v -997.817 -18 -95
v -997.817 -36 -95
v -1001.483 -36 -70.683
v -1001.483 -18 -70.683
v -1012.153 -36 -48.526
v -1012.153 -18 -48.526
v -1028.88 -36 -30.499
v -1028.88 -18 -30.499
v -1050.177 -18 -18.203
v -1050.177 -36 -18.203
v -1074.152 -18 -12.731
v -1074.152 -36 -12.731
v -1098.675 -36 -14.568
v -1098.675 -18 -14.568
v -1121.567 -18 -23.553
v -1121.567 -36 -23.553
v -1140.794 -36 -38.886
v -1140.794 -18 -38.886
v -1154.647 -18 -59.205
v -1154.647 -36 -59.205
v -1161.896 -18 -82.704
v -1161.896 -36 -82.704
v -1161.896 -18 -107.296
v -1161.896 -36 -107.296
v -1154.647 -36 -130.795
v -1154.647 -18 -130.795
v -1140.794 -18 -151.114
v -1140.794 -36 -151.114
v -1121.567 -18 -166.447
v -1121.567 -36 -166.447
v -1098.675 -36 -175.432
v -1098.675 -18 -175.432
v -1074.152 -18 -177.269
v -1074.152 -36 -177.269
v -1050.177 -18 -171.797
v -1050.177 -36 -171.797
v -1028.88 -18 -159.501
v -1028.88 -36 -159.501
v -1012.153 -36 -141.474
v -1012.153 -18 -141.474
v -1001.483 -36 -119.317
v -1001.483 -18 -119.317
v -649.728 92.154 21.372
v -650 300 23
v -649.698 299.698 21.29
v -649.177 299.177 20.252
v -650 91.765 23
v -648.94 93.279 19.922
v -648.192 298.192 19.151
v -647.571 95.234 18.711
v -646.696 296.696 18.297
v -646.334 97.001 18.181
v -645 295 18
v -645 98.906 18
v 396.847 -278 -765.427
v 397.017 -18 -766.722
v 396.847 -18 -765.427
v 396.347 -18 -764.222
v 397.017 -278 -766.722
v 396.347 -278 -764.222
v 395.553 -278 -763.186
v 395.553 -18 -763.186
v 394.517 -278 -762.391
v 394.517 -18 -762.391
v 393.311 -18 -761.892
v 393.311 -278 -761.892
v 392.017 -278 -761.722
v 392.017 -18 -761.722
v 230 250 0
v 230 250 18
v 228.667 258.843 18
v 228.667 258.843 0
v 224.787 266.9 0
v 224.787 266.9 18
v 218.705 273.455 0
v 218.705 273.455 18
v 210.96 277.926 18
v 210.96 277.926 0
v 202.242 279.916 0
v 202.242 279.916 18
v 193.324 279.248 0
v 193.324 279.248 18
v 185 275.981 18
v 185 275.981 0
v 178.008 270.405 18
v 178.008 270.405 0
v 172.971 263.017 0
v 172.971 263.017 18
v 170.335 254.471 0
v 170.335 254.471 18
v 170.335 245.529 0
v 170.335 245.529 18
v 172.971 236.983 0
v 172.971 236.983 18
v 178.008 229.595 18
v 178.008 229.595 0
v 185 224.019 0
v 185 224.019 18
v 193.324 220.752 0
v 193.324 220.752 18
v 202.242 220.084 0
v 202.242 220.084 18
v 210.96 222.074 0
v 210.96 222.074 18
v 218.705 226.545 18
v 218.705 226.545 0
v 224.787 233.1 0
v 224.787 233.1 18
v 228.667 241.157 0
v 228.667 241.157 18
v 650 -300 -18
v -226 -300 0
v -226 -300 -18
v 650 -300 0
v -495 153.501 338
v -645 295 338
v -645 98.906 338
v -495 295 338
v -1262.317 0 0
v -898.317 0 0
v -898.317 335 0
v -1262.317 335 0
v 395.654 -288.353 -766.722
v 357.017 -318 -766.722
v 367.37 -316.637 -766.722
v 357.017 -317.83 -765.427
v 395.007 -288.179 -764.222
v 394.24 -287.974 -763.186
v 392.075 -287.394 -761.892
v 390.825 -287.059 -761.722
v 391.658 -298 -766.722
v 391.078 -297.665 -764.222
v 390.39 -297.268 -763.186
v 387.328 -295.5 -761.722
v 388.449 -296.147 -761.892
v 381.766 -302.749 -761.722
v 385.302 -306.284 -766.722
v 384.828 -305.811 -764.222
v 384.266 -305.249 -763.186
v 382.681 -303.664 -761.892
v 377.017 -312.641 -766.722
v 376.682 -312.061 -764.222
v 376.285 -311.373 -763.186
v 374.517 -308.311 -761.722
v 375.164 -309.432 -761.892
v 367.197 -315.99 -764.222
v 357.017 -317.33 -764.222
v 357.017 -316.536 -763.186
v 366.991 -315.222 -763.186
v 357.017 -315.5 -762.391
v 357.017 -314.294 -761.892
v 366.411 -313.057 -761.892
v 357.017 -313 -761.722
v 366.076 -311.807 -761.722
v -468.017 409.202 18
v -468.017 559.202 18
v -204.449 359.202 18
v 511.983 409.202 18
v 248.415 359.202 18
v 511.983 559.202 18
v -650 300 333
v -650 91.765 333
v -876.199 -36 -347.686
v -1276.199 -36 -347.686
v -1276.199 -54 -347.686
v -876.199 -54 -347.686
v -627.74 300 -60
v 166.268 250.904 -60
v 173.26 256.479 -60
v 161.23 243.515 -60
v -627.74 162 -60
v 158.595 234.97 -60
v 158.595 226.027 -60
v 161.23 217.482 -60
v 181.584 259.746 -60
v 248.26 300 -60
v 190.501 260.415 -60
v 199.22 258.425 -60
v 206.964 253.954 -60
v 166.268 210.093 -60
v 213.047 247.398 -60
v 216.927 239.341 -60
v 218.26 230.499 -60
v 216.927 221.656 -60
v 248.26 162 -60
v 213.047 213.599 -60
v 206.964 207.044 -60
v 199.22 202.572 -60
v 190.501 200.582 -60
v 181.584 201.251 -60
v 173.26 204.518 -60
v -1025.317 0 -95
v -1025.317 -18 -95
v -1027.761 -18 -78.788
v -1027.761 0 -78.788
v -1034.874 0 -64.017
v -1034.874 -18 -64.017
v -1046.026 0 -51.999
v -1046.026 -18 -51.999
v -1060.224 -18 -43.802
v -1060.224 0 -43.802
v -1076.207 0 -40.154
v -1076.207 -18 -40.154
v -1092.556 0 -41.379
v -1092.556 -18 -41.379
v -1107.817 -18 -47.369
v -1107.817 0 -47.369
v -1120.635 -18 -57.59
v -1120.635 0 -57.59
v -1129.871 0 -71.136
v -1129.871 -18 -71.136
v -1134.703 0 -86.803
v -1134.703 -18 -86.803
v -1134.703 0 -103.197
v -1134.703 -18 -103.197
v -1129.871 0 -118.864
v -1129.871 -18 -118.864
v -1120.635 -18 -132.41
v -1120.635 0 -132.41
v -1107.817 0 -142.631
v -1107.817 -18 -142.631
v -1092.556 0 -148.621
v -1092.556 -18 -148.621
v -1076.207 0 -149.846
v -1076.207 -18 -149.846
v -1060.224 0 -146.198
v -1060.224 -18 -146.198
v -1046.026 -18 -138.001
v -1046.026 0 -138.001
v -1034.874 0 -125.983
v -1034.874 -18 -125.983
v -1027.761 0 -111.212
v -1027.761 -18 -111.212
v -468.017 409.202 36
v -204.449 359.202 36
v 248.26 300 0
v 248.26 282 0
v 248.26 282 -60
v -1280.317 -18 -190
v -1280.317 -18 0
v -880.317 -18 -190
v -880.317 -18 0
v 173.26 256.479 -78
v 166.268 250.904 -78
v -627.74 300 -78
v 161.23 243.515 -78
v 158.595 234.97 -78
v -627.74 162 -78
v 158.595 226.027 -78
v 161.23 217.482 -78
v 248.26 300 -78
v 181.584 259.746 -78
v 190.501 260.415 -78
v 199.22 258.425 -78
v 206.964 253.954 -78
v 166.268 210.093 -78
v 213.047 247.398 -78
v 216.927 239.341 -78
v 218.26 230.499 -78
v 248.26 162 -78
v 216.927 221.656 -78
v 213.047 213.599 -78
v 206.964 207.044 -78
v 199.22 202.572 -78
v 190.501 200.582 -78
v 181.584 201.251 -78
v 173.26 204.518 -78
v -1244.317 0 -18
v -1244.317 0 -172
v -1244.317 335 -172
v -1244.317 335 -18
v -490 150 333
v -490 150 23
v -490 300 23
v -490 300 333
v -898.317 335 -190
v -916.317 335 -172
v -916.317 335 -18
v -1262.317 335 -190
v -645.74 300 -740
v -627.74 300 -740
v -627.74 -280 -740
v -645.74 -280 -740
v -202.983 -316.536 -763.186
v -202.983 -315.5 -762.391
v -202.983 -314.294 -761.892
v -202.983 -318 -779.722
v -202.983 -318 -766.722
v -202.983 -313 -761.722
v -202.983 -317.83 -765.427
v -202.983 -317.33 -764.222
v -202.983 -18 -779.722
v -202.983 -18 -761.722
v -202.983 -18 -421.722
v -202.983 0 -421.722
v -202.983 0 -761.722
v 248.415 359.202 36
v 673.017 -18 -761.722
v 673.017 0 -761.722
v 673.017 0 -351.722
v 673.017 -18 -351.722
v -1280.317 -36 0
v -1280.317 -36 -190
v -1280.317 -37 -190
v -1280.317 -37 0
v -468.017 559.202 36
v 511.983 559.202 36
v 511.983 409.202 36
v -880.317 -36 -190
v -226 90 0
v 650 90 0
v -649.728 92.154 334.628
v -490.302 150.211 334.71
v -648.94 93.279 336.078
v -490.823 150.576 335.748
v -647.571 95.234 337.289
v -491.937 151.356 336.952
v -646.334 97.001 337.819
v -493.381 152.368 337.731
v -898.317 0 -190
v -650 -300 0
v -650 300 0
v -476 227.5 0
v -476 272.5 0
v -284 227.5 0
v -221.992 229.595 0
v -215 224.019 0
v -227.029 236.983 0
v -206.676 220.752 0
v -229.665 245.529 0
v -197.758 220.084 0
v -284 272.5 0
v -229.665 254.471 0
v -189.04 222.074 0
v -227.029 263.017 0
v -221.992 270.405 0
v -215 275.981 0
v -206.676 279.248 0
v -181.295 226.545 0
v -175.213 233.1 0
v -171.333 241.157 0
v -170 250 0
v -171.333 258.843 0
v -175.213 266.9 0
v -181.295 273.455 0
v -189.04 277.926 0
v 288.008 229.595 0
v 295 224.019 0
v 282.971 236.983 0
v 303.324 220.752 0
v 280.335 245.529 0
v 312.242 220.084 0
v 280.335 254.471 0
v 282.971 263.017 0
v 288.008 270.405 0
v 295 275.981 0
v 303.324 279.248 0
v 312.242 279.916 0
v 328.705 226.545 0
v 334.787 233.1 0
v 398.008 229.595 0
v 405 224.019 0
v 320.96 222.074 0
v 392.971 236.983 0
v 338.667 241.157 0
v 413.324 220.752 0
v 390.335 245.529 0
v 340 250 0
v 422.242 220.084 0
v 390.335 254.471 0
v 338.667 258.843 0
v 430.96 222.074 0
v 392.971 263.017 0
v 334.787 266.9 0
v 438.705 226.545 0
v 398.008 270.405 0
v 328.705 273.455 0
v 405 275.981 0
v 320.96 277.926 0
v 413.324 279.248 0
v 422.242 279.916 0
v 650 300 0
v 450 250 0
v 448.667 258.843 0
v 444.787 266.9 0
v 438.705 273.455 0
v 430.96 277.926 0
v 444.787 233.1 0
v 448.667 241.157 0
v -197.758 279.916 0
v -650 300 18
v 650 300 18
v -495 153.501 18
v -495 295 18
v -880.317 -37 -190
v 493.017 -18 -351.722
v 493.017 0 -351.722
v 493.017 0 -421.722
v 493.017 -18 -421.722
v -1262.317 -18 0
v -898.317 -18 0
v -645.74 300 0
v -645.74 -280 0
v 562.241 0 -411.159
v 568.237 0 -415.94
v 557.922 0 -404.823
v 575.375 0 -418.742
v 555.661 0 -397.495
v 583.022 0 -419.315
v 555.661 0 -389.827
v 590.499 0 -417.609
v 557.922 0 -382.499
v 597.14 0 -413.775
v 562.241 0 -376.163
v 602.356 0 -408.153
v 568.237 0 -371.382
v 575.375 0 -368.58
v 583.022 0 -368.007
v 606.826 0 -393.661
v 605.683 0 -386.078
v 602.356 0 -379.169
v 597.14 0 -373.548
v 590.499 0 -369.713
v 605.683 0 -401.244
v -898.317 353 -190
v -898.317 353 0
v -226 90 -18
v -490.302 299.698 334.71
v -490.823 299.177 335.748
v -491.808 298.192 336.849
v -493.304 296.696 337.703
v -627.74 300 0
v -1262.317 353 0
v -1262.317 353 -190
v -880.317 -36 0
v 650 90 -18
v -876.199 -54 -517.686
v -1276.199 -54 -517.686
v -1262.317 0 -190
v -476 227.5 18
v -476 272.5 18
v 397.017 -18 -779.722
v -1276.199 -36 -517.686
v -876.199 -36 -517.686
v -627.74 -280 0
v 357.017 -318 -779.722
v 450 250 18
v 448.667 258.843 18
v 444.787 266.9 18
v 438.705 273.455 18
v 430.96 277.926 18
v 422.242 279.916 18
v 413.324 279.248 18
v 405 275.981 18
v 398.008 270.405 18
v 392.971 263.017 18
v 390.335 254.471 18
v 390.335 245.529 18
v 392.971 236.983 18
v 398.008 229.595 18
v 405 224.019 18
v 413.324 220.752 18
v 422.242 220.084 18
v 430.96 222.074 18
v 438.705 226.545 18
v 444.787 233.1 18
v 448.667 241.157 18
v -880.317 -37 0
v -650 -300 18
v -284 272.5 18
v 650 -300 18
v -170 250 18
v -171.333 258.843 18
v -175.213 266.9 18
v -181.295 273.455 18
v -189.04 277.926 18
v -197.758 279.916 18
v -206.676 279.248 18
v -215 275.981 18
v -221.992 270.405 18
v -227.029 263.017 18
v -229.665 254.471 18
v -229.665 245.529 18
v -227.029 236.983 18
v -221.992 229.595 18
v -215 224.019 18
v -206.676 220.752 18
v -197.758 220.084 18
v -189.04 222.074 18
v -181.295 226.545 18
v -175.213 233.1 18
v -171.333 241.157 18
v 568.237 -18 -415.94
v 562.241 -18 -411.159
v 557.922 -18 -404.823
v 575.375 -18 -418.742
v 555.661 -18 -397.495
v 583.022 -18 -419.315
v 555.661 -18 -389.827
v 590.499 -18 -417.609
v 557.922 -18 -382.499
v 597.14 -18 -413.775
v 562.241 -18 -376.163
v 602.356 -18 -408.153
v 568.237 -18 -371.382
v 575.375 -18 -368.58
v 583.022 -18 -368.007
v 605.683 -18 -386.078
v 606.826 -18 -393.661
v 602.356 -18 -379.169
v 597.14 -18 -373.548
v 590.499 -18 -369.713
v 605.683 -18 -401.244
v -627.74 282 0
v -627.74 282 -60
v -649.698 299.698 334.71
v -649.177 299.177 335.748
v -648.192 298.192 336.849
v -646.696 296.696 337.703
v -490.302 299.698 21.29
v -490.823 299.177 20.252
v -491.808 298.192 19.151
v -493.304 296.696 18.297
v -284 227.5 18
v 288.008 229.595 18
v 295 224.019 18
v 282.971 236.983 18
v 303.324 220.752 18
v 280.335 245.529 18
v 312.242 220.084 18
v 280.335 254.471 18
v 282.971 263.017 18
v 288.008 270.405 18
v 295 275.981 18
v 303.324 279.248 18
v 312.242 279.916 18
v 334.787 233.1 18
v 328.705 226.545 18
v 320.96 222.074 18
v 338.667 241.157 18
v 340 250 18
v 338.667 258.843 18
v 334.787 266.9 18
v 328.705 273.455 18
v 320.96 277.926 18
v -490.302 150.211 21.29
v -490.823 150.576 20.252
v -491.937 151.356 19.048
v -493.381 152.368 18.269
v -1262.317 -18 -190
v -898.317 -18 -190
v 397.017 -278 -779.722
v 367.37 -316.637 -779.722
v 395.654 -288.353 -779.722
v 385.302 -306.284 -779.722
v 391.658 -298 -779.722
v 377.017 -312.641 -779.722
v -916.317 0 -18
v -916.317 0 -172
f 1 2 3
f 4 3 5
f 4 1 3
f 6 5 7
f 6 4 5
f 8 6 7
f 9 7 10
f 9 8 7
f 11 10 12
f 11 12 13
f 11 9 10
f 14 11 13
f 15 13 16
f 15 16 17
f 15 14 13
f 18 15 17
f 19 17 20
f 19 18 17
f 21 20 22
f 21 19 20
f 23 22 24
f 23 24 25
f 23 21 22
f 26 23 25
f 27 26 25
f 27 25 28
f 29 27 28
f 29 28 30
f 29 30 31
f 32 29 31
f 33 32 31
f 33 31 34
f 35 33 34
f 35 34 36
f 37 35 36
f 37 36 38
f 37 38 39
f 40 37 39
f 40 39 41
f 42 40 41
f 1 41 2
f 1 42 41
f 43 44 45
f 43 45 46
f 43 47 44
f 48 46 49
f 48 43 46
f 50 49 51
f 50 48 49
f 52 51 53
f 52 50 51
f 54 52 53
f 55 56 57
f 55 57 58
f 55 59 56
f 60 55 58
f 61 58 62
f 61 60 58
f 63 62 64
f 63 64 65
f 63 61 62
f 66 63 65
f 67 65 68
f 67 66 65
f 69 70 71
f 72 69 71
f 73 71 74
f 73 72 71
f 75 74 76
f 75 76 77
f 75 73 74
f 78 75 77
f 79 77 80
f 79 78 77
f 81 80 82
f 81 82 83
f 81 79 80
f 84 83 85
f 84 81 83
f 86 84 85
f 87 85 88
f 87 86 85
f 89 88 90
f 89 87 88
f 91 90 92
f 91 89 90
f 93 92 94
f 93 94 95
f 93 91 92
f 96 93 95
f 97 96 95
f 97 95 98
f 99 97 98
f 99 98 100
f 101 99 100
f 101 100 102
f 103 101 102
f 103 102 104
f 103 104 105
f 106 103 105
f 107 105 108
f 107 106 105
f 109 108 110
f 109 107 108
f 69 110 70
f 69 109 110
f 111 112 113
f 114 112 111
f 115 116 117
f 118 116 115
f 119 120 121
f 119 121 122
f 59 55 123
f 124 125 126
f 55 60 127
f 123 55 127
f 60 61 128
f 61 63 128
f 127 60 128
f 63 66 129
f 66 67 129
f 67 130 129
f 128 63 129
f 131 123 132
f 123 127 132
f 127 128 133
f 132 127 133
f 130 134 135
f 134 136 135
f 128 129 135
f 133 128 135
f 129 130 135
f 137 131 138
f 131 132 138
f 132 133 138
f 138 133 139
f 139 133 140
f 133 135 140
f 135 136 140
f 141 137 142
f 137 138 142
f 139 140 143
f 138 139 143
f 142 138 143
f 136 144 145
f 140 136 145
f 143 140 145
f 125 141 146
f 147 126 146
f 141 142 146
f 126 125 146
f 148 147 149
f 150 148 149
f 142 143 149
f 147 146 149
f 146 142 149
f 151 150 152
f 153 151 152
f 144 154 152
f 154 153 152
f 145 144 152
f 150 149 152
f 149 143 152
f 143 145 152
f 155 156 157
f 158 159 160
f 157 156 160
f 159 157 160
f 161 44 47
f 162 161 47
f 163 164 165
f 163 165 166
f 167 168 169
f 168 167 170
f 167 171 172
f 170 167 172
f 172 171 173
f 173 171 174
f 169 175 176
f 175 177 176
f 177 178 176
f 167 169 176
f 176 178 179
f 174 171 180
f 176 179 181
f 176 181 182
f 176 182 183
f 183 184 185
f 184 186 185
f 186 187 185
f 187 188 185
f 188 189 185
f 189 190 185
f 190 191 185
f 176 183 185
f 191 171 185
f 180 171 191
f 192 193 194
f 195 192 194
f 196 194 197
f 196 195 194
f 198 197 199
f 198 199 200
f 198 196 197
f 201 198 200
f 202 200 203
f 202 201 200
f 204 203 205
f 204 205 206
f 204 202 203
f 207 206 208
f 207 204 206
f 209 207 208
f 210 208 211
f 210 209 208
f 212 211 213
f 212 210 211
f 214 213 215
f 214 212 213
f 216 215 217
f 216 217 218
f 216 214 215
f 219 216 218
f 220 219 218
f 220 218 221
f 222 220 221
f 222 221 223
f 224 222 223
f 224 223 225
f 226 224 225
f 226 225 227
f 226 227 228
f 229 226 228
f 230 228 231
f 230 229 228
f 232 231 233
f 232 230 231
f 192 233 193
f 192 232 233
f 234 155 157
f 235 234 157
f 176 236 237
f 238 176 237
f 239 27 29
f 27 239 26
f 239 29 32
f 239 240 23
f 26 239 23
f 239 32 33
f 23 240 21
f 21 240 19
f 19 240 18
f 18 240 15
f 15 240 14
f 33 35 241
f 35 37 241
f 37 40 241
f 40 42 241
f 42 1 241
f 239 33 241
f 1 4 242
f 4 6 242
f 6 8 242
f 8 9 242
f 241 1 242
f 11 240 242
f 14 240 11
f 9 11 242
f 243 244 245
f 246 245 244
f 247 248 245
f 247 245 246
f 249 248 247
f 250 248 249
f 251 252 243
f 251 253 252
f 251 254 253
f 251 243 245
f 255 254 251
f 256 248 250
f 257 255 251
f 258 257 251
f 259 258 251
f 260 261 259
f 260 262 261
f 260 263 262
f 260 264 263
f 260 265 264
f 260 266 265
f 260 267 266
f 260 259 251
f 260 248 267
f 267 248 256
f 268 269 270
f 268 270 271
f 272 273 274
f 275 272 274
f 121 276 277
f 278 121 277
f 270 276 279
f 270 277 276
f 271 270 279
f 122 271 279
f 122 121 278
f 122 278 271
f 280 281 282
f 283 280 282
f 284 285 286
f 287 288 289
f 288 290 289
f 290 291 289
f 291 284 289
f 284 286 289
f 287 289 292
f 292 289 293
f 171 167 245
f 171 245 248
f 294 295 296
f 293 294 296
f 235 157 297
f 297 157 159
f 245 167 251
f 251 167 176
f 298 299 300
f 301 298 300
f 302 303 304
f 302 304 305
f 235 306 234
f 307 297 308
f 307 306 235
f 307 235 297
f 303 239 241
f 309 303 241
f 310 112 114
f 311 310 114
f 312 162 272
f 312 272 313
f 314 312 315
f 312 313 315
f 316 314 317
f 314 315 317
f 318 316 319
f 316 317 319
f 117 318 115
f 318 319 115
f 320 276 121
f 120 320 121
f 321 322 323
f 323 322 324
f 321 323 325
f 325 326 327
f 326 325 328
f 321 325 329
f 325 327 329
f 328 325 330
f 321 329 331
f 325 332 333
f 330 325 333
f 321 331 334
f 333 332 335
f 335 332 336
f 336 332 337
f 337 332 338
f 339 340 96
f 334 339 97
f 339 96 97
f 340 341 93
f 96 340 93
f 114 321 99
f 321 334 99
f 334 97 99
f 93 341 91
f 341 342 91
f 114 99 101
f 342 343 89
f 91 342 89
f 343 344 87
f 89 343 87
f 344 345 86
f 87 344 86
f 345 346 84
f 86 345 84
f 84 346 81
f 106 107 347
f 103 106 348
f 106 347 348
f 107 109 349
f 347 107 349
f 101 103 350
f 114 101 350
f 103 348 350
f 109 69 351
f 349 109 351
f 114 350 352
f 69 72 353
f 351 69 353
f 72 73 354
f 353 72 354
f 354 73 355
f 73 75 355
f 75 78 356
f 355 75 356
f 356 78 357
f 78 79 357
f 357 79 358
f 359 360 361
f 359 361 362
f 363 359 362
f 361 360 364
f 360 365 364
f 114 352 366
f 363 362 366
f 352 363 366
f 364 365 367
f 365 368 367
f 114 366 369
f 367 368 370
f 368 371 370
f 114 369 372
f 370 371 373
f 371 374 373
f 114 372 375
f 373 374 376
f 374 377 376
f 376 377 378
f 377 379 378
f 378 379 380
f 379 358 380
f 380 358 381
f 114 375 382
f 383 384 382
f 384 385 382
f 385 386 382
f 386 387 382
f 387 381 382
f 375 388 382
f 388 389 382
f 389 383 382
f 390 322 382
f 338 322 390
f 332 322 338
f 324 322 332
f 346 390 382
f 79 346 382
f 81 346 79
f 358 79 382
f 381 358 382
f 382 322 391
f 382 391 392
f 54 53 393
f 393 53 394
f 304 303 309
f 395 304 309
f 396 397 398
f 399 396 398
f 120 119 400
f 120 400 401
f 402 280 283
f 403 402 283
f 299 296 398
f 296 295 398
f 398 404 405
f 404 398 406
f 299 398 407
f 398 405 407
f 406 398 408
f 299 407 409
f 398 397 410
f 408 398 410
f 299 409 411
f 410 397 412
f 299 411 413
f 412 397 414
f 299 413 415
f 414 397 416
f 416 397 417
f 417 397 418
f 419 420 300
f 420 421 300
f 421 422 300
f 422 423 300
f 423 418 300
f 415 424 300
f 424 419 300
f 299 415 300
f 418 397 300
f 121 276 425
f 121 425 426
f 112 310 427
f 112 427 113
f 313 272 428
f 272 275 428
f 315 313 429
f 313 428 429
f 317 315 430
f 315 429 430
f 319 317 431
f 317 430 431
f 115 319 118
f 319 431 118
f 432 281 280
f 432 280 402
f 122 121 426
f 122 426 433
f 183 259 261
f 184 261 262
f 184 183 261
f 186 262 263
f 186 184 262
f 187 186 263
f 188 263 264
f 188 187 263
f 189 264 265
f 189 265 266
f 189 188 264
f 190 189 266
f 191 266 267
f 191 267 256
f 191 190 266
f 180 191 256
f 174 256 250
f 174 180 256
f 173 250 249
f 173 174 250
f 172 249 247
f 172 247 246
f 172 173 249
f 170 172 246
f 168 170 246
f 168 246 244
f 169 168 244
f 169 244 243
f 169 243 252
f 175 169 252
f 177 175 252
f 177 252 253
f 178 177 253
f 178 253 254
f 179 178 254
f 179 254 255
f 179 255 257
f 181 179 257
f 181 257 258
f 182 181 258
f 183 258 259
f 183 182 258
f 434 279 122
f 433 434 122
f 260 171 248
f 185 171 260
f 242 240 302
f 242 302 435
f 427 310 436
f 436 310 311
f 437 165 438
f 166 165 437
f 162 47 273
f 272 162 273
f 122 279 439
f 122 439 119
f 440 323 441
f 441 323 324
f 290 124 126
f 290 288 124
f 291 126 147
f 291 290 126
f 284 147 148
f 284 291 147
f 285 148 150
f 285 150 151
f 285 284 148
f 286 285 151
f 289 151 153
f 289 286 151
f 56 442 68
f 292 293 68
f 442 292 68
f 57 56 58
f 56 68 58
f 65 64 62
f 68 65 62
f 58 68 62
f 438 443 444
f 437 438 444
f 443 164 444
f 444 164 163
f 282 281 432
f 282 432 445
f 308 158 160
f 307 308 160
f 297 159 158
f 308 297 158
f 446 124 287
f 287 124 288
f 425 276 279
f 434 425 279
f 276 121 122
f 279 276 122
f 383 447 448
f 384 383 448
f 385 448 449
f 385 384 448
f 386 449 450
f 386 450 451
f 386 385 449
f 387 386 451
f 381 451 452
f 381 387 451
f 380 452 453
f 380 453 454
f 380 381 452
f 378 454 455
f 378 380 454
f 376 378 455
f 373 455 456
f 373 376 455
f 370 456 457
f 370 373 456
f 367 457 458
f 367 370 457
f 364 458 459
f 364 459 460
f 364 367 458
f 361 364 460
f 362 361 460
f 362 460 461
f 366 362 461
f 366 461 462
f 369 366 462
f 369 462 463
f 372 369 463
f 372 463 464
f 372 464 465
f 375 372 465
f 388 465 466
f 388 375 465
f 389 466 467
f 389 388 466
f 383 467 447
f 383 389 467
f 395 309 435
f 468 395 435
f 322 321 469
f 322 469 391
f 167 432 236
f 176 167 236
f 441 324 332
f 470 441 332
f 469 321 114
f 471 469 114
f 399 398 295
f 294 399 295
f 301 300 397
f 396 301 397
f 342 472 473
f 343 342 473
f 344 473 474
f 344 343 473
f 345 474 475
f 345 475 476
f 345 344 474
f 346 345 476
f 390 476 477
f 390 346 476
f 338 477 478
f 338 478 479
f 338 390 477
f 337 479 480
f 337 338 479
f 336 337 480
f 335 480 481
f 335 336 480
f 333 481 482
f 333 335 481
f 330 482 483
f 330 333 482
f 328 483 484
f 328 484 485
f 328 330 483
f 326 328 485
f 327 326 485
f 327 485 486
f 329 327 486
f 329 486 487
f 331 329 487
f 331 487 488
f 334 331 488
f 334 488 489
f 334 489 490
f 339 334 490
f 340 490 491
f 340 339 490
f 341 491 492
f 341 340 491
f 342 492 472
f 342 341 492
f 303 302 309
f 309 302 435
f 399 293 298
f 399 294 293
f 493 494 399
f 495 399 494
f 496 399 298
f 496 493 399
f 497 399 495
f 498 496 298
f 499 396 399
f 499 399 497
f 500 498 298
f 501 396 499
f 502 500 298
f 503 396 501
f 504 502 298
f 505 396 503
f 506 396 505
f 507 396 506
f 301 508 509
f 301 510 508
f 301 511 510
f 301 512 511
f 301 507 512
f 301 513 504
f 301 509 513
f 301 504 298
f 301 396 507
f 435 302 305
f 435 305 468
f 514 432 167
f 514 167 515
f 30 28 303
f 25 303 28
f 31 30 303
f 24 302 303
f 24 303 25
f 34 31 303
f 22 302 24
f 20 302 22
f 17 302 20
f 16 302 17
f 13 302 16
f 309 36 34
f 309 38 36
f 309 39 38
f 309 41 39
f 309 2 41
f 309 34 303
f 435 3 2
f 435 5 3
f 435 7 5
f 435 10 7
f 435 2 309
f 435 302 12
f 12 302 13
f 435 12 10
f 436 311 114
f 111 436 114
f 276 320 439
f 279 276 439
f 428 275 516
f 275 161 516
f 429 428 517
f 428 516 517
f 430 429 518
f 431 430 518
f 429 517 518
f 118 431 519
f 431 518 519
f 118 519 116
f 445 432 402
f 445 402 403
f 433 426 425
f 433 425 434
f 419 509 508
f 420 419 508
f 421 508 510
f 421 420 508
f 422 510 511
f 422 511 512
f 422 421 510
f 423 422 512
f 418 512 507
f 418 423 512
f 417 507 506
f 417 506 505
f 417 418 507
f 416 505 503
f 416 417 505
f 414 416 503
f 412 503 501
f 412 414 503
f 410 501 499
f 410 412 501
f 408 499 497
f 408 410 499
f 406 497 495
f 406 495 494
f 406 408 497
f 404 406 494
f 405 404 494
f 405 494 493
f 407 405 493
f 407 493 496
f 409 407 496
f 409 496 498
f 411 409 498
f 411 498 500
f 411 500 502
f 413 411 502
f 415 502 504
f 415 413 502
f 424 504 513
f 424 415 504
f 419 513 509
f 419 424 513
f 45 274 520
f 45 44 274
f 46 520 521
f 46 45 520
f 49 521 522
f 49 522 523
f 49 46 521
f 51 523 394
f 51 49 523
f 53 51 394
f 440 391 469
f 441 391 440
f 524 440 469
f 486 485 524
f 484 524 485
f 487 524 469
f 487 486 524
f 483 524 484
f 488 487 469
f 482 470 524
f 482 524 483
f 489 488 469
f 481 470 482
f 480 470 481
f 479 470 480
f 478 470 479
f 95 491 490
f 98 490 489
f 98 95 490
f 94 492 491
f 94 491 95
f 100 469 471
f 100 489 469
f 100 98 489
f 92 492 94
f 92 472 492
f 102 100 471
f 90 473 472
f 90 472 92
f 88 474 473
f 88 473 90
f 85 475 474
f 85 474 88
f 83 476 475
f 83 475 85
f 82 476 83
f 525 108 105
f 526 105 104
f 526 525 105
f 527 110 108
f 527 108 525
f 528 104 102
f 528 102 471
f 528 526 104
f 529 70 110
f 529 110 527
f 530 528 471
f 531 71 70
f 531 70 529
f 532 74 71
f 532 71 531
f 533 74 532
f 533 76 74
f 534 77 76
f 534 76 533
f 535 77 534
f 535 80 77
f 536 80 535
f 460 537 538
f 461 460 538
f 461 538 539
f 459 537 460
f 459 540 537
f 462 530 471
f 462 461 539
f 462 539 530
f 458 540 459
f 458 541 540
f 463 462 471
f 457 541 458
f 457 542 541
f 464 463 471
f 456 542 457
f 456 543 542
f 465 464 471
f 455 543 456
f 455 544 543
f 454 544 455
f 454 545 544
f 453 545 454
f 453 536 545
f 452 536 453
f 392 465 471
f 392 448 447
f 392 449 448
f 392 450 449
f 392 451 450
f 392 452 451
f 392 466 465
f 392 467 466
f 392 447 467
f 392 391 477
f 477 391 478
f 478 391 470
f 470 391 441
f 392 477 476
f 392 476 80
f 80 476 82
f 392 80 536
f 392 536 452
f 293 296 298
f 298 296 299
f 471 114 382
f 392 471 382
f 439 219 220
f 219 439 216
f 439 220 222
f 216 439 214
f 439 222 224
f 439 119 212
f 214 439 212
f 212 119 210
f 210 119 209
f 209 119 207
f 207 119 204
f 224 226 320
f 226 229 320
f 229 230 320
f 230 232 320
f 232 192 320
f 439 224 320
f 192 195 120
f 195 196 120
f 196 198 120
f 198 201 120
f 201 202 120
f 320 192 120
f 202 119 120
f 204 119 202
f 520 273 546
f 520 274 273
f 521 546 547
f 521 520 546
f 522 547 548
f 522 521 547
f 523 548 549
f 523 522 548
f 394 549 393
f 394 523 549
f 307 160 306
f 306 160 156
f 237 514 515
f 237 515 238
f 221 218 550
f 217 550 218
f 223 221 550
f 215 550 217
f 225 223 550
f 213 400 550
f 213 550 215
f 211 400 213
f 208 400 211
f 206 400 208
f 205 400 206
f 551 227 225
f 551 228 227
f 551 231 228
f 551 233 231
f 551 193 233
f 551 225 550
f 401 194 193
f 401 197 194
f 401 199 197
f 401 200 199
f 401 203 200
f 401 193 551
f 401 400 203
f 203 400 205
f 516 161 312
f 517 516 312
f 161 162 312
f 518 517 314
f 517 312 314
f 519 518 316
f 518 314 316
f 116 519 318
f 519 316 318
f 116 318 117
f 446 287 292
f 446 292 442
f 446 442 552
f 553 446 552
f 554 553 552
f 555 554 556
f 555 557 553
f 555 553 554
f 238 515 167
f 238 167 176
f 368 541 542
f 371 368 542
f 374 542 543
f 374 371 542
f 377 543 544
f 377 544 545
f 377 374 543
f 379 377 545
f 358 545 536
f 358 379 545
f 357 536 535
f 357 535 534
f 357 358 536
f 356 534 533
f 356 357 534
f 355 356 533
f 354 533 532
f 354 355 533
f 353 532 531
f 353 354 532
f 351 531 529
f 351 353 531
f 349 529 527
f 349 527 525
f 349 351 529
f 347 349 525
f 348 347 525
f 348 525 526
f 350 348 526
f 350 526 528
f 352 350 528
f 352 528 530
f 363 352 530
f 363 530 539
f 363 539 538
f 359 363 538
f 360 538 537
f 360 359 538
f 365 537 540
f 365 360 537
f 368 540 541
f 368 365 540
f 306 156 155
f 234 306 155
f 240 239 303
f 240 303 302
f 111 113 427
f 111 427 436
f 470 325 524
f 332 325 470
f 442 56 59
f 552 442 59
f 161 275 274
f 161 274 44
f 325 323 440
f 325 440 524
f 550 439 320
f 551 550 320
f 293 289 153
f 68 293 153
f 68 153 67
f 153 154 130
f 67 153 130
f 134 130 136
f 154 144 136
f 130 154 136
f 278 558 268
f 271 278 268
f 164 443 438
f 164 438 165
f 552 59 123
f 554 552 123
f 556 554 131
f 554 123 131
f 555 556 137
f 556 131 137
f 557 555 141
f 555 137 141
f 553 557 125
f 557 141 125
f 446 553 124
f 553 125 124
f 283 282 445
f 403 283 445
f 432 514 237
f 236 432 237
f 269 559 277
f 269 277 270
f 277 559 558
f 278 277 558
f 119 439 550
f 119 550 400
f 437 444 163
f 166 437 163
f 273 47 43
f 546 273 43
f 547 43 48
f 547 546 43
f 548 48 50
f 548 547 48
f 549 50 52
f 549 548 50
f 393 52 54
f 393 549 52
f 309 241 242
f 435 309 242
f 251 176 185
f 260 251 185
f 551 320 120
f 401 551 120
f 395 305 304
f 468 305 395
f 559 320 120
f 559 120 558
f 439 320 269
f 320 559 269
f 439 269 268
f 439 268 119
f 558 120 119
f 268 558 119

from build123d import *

# Parameters (mm, degrees)
F0_W      = 1300
F0_H      = 600
F0_W_2    = 192
F0_H_2    = 45
F0_R      = 30
F1_DEPTH  = 18
F2_W      = 876
F2_H      = 18
F3_DEPTH  = 60
F4_W      = 876
F4_H      = 138
F4_R      = 30
F5_DEPTH  = 18
F6_W      = 580
F6_H      = 740
F7_DEPTH  = 18
F9_DEPTH  = 320
F10_W     = 364
F10_H     = 190
F10_R     = 55
F11_DEPTH = 18
F12_W     = 364
F12_H     = 190
F12_W_2   = 328
F12_H_2   = 154
F13_DEPTH = 335
F14_W     = 400
F14_H     = 190
F14_R     = 82.5
F15_DEPTH = 18
F16_W     = 364
F16_H     = 190
F17_DEPTH = 18
F18_W     = 876
F18_H     = 390
F19_DEPTH = 18
F20_R     = 25.7260339454
F21_DEPTH = 18
F23_DEPTH = 18
F24_R     = 5
F25_W     = 400
F25_H     = 170
F26_DEPTH = 18
F27_W     = 400
F27_H     = 190
F28_DEPTH = 1
F30_DEPTH = 18
F31_R     = 5


with BuildPart() as f1:
    # F0 (on Top) → F1 (new body)
    with BuildSketch(Plane.XY):
        Rectangle(F0_W, F0_H)
        with Locations((-380, 250)):
            Rectangle(F0_W_2, F0_H_2, mode=Mode.SUBTRACT)
        with Locations((-200, 250)):
            Circle(F0_R, mode=Mode.SUBTRACT)
        with Locations((200, 250)):
            Circle(F0_R, mode=Mode.SUBTRACT)
        with Locations((310, 250)):
            Circle(F0_R, mode=Mode.SUBTRACT)
        with Locations((420, 250)):
            Circle(F0_R, mode=Mode.SUBTRACT)
    extrude(amount=F1_DEPTH)


with BuildPart() as f3:
    # F2 (on face) → F3 (new body)
    with BuildSketch(Plane(origin=(0, 0, 0), x_dir=(1, 0, 0), z_dir=(0, 0, -1))):
        with Locations((-189.7404427528, -291)):
            Rectangle(F2_W, F2_H)
    extrude(amount=F3_DEPTH)


with BuildPart() as f5:
    # F4 (on face) → F5 (new body)
    with BuildSketch(Plane(origin=(0, 0, -60), x_dir=(1, 0, 0), z_dir=(0, 0, -1))):
        with Locations((-189.7404427528, -231)):
            Rectangle(F4_W, F4_H)
        with Locations((188.2595572472, -230.4985970259)):
            Circle(F4_R, mode=Mode.SUBTRACT)
    extrude(amount=F5_DEPTH)


with BuildPart() as f7:
    # F6 (on face) → F7 (new body)
    with BuildSketch(Plane(origin=(-627.7404427528, 0, 0), x_dir=(0, -1, 0), z_dir=(-1, 0, 0))):
        with Locations((-10, -370)):
            Rectangle(F6_W, F6_H)
    extrude(amount=F7_DEPTH)


with BuildPart() as f9:
    # F8 (on face) → F9 (new body)
    with BuildSketch(Plane.XY.offset(18)):
        Polygon((-490, 300), (-650, 300), (-650, 91.7647625174), (-490, 150), align=None)
    extrude(amount=F9_DEPTH)

    # F31
    f31_edges = [f9.edges().sort_by_distance(p)[0] for p in [
        (-650, 195.882381, 338),
        (-570, 120.882381, 338),
        (-490, 225, 338),
        (-570, 300, 338),
        (-570, 120.882381, 18),
        (-490, 225, 18),
        (-570, 300, 18),
        (-650, 195.882381, 18),
    ]]
    fillet(f31_edges, radius=F31_R)


with BuildPart() as f11:
    # F10 (on Front) → F11 (new body)
    with BuildSketch(Plane.XZ):
        with Locations((-1080.3174972534, -95)):
            Rectangle(F10_W, F10_H)
        with Locations((-1080.3174972534, -95)):
            Circle(F10_R, mode=Mode.SUBTRACT)
    extrude(amount=F11_DEPTH)


with BuildPart() as f13:
    # F12 (on face) → F13 (new body)
    with BuildSketch(Plane(origin=(0, 0, 0), x_dir=(-1, 0, 0), z_dir=(0, 1, 0))):
        with Locations((1080.3174972534, -95)):
            Rectangle(F12_W, F12_H)
        with Locations((1080.3174972534, -95)):
            Rectangle(F12_W_2, F12_H_2, mode=Mode.SUBTRACT)
    extrude(amount=F13_DEPTH)


with BuildPart() as f15:
    # F14 (on face) → F15 (new body)
    with BuildSketch(Plane.XZ.offset(18)):
        with Locations((-1080.3174972534, -95)):
            Rectangle(F14_W, F14_H)
        with Locations((-1080.3174972534, -95)):
            Circle(F14_R, mode=Mode.SUBTRACT)
    extrude(amount=F15_DEPTH)


with BuildPart() as f17:
    # F16 (on face) → F17 (new body)
    with BuildSketch(Plane(origin=(0, 335, 0), x_dir=(-1, 0, 0), z_dir=(0, 1, 0))):
        with Locations((1080.3174972534, -95)):
            Rectangle(F16_W, F16_H)
    extrude(amount=F17_DEPTH)


with BuildPart() as f19:
    # F18 (on face) → F19 (new body)
    with BuildSketch(Plane(origin=(0, 0, 0), x_dir=(1, 0, 0), z_dir=(0, 0, -1))):
        with Locations((212, 105)):
            Rectangle(F18_W, F18_H)
    extrude(amount=F19_DEPTH)


with BuildPart() as f21:
    # F20 (on Front) → F21 (new body)
    with BuildSketch(Plane.XZ):
        Polygon((-202.9826407433, -761.7215034605), (673.0173592567, -761.7215034605), (673.0173592567, -351.7215034605), (493.0173592567, -351.7215034605), (493.0173592567, -421.7215034605), (-202.9826407433, -421.7215034605), align=None)
        with Locations((581.0999274254, -393.6610817909)):
            Circle(F20_R, mode=Mode.SUBTRACT)
    extrude(amount=F21_DEPTH)


with BuildPart() as f23:
    # F22 (on face) → F23 (new body)
    with BuildSketch(Plane(origin=(0, 0, -761.7215034605), x_dir=(1, 0, 0), z_dir=(0, 0, -1))):
        with BuildLine():
            Line((-202.9826407433, 318), (-202.9826407433, 18))
            Line((-202.9826407433, 18), (397.0173592567, 18))
            Line((397.0173592567, 18), (397.0173592567, 278))
            ThreePointArc((397.0173592567, 278), (385.3016305042, 306.2842712475), (357.0173592567, 318))
            Line((357.0173592567, 318), (-202.9826407433, 318))
        make_face()
    extrude(amount=F23_DEPTH)

    # F24
    f24_edges = [f23.edges().sort_by_distance(p)[0] for p in [
        (77.017359, -318, -761.721503),
        (385.301631, -306.284271, -761.721503),
        (397.017359, -148, -761.721503),
    ]]
    fillet(f24_edges, radius=F24_R)


with BuildPart() as f26:
    # F25 (on face) → F26 (new body)
    with BuildSketch(Plane.XZ.offset(36)):
        with Locations((-1076.1992037296, -432.6862716079)):
            Rectangle(F25_W, F25_H)
    extrude(amount=F26_DEPTH)


with BuildPart() as f28:
    # F27 (on face) → F28 (new body)
    with BuildSketch(Plane.XZ.offset(36)):
        with Locations((-1080.3174972534, -95)):
            Rectangle(F27_W, F27_H)
    extrude(amount=F28_DEPTH)


with BuildPart() as f30:
    # F29 (on face) → F30 (new body)
    with BuildSketch(Plane.XY.offset(18)):
        Polygon((511.9828635454, 559.2021584511), (-468.0171364546, 559.2021584511), (-468.0171364546, 409.2021584511), (-204.4491767883, 359.2021584511), (248.4149038792, 359.2021584511), (511.9828635454, 409.2021584511), align=None)
    extrude(amount=F30_DEPTH)


solid = Compound([f1.part, f3.part, f5.part, f7.part, f9.part, f11.part, f13.part, f15.part, f17.part, f19.part, f21.part, f23.part, f26.part, f28.part, f30.part])
